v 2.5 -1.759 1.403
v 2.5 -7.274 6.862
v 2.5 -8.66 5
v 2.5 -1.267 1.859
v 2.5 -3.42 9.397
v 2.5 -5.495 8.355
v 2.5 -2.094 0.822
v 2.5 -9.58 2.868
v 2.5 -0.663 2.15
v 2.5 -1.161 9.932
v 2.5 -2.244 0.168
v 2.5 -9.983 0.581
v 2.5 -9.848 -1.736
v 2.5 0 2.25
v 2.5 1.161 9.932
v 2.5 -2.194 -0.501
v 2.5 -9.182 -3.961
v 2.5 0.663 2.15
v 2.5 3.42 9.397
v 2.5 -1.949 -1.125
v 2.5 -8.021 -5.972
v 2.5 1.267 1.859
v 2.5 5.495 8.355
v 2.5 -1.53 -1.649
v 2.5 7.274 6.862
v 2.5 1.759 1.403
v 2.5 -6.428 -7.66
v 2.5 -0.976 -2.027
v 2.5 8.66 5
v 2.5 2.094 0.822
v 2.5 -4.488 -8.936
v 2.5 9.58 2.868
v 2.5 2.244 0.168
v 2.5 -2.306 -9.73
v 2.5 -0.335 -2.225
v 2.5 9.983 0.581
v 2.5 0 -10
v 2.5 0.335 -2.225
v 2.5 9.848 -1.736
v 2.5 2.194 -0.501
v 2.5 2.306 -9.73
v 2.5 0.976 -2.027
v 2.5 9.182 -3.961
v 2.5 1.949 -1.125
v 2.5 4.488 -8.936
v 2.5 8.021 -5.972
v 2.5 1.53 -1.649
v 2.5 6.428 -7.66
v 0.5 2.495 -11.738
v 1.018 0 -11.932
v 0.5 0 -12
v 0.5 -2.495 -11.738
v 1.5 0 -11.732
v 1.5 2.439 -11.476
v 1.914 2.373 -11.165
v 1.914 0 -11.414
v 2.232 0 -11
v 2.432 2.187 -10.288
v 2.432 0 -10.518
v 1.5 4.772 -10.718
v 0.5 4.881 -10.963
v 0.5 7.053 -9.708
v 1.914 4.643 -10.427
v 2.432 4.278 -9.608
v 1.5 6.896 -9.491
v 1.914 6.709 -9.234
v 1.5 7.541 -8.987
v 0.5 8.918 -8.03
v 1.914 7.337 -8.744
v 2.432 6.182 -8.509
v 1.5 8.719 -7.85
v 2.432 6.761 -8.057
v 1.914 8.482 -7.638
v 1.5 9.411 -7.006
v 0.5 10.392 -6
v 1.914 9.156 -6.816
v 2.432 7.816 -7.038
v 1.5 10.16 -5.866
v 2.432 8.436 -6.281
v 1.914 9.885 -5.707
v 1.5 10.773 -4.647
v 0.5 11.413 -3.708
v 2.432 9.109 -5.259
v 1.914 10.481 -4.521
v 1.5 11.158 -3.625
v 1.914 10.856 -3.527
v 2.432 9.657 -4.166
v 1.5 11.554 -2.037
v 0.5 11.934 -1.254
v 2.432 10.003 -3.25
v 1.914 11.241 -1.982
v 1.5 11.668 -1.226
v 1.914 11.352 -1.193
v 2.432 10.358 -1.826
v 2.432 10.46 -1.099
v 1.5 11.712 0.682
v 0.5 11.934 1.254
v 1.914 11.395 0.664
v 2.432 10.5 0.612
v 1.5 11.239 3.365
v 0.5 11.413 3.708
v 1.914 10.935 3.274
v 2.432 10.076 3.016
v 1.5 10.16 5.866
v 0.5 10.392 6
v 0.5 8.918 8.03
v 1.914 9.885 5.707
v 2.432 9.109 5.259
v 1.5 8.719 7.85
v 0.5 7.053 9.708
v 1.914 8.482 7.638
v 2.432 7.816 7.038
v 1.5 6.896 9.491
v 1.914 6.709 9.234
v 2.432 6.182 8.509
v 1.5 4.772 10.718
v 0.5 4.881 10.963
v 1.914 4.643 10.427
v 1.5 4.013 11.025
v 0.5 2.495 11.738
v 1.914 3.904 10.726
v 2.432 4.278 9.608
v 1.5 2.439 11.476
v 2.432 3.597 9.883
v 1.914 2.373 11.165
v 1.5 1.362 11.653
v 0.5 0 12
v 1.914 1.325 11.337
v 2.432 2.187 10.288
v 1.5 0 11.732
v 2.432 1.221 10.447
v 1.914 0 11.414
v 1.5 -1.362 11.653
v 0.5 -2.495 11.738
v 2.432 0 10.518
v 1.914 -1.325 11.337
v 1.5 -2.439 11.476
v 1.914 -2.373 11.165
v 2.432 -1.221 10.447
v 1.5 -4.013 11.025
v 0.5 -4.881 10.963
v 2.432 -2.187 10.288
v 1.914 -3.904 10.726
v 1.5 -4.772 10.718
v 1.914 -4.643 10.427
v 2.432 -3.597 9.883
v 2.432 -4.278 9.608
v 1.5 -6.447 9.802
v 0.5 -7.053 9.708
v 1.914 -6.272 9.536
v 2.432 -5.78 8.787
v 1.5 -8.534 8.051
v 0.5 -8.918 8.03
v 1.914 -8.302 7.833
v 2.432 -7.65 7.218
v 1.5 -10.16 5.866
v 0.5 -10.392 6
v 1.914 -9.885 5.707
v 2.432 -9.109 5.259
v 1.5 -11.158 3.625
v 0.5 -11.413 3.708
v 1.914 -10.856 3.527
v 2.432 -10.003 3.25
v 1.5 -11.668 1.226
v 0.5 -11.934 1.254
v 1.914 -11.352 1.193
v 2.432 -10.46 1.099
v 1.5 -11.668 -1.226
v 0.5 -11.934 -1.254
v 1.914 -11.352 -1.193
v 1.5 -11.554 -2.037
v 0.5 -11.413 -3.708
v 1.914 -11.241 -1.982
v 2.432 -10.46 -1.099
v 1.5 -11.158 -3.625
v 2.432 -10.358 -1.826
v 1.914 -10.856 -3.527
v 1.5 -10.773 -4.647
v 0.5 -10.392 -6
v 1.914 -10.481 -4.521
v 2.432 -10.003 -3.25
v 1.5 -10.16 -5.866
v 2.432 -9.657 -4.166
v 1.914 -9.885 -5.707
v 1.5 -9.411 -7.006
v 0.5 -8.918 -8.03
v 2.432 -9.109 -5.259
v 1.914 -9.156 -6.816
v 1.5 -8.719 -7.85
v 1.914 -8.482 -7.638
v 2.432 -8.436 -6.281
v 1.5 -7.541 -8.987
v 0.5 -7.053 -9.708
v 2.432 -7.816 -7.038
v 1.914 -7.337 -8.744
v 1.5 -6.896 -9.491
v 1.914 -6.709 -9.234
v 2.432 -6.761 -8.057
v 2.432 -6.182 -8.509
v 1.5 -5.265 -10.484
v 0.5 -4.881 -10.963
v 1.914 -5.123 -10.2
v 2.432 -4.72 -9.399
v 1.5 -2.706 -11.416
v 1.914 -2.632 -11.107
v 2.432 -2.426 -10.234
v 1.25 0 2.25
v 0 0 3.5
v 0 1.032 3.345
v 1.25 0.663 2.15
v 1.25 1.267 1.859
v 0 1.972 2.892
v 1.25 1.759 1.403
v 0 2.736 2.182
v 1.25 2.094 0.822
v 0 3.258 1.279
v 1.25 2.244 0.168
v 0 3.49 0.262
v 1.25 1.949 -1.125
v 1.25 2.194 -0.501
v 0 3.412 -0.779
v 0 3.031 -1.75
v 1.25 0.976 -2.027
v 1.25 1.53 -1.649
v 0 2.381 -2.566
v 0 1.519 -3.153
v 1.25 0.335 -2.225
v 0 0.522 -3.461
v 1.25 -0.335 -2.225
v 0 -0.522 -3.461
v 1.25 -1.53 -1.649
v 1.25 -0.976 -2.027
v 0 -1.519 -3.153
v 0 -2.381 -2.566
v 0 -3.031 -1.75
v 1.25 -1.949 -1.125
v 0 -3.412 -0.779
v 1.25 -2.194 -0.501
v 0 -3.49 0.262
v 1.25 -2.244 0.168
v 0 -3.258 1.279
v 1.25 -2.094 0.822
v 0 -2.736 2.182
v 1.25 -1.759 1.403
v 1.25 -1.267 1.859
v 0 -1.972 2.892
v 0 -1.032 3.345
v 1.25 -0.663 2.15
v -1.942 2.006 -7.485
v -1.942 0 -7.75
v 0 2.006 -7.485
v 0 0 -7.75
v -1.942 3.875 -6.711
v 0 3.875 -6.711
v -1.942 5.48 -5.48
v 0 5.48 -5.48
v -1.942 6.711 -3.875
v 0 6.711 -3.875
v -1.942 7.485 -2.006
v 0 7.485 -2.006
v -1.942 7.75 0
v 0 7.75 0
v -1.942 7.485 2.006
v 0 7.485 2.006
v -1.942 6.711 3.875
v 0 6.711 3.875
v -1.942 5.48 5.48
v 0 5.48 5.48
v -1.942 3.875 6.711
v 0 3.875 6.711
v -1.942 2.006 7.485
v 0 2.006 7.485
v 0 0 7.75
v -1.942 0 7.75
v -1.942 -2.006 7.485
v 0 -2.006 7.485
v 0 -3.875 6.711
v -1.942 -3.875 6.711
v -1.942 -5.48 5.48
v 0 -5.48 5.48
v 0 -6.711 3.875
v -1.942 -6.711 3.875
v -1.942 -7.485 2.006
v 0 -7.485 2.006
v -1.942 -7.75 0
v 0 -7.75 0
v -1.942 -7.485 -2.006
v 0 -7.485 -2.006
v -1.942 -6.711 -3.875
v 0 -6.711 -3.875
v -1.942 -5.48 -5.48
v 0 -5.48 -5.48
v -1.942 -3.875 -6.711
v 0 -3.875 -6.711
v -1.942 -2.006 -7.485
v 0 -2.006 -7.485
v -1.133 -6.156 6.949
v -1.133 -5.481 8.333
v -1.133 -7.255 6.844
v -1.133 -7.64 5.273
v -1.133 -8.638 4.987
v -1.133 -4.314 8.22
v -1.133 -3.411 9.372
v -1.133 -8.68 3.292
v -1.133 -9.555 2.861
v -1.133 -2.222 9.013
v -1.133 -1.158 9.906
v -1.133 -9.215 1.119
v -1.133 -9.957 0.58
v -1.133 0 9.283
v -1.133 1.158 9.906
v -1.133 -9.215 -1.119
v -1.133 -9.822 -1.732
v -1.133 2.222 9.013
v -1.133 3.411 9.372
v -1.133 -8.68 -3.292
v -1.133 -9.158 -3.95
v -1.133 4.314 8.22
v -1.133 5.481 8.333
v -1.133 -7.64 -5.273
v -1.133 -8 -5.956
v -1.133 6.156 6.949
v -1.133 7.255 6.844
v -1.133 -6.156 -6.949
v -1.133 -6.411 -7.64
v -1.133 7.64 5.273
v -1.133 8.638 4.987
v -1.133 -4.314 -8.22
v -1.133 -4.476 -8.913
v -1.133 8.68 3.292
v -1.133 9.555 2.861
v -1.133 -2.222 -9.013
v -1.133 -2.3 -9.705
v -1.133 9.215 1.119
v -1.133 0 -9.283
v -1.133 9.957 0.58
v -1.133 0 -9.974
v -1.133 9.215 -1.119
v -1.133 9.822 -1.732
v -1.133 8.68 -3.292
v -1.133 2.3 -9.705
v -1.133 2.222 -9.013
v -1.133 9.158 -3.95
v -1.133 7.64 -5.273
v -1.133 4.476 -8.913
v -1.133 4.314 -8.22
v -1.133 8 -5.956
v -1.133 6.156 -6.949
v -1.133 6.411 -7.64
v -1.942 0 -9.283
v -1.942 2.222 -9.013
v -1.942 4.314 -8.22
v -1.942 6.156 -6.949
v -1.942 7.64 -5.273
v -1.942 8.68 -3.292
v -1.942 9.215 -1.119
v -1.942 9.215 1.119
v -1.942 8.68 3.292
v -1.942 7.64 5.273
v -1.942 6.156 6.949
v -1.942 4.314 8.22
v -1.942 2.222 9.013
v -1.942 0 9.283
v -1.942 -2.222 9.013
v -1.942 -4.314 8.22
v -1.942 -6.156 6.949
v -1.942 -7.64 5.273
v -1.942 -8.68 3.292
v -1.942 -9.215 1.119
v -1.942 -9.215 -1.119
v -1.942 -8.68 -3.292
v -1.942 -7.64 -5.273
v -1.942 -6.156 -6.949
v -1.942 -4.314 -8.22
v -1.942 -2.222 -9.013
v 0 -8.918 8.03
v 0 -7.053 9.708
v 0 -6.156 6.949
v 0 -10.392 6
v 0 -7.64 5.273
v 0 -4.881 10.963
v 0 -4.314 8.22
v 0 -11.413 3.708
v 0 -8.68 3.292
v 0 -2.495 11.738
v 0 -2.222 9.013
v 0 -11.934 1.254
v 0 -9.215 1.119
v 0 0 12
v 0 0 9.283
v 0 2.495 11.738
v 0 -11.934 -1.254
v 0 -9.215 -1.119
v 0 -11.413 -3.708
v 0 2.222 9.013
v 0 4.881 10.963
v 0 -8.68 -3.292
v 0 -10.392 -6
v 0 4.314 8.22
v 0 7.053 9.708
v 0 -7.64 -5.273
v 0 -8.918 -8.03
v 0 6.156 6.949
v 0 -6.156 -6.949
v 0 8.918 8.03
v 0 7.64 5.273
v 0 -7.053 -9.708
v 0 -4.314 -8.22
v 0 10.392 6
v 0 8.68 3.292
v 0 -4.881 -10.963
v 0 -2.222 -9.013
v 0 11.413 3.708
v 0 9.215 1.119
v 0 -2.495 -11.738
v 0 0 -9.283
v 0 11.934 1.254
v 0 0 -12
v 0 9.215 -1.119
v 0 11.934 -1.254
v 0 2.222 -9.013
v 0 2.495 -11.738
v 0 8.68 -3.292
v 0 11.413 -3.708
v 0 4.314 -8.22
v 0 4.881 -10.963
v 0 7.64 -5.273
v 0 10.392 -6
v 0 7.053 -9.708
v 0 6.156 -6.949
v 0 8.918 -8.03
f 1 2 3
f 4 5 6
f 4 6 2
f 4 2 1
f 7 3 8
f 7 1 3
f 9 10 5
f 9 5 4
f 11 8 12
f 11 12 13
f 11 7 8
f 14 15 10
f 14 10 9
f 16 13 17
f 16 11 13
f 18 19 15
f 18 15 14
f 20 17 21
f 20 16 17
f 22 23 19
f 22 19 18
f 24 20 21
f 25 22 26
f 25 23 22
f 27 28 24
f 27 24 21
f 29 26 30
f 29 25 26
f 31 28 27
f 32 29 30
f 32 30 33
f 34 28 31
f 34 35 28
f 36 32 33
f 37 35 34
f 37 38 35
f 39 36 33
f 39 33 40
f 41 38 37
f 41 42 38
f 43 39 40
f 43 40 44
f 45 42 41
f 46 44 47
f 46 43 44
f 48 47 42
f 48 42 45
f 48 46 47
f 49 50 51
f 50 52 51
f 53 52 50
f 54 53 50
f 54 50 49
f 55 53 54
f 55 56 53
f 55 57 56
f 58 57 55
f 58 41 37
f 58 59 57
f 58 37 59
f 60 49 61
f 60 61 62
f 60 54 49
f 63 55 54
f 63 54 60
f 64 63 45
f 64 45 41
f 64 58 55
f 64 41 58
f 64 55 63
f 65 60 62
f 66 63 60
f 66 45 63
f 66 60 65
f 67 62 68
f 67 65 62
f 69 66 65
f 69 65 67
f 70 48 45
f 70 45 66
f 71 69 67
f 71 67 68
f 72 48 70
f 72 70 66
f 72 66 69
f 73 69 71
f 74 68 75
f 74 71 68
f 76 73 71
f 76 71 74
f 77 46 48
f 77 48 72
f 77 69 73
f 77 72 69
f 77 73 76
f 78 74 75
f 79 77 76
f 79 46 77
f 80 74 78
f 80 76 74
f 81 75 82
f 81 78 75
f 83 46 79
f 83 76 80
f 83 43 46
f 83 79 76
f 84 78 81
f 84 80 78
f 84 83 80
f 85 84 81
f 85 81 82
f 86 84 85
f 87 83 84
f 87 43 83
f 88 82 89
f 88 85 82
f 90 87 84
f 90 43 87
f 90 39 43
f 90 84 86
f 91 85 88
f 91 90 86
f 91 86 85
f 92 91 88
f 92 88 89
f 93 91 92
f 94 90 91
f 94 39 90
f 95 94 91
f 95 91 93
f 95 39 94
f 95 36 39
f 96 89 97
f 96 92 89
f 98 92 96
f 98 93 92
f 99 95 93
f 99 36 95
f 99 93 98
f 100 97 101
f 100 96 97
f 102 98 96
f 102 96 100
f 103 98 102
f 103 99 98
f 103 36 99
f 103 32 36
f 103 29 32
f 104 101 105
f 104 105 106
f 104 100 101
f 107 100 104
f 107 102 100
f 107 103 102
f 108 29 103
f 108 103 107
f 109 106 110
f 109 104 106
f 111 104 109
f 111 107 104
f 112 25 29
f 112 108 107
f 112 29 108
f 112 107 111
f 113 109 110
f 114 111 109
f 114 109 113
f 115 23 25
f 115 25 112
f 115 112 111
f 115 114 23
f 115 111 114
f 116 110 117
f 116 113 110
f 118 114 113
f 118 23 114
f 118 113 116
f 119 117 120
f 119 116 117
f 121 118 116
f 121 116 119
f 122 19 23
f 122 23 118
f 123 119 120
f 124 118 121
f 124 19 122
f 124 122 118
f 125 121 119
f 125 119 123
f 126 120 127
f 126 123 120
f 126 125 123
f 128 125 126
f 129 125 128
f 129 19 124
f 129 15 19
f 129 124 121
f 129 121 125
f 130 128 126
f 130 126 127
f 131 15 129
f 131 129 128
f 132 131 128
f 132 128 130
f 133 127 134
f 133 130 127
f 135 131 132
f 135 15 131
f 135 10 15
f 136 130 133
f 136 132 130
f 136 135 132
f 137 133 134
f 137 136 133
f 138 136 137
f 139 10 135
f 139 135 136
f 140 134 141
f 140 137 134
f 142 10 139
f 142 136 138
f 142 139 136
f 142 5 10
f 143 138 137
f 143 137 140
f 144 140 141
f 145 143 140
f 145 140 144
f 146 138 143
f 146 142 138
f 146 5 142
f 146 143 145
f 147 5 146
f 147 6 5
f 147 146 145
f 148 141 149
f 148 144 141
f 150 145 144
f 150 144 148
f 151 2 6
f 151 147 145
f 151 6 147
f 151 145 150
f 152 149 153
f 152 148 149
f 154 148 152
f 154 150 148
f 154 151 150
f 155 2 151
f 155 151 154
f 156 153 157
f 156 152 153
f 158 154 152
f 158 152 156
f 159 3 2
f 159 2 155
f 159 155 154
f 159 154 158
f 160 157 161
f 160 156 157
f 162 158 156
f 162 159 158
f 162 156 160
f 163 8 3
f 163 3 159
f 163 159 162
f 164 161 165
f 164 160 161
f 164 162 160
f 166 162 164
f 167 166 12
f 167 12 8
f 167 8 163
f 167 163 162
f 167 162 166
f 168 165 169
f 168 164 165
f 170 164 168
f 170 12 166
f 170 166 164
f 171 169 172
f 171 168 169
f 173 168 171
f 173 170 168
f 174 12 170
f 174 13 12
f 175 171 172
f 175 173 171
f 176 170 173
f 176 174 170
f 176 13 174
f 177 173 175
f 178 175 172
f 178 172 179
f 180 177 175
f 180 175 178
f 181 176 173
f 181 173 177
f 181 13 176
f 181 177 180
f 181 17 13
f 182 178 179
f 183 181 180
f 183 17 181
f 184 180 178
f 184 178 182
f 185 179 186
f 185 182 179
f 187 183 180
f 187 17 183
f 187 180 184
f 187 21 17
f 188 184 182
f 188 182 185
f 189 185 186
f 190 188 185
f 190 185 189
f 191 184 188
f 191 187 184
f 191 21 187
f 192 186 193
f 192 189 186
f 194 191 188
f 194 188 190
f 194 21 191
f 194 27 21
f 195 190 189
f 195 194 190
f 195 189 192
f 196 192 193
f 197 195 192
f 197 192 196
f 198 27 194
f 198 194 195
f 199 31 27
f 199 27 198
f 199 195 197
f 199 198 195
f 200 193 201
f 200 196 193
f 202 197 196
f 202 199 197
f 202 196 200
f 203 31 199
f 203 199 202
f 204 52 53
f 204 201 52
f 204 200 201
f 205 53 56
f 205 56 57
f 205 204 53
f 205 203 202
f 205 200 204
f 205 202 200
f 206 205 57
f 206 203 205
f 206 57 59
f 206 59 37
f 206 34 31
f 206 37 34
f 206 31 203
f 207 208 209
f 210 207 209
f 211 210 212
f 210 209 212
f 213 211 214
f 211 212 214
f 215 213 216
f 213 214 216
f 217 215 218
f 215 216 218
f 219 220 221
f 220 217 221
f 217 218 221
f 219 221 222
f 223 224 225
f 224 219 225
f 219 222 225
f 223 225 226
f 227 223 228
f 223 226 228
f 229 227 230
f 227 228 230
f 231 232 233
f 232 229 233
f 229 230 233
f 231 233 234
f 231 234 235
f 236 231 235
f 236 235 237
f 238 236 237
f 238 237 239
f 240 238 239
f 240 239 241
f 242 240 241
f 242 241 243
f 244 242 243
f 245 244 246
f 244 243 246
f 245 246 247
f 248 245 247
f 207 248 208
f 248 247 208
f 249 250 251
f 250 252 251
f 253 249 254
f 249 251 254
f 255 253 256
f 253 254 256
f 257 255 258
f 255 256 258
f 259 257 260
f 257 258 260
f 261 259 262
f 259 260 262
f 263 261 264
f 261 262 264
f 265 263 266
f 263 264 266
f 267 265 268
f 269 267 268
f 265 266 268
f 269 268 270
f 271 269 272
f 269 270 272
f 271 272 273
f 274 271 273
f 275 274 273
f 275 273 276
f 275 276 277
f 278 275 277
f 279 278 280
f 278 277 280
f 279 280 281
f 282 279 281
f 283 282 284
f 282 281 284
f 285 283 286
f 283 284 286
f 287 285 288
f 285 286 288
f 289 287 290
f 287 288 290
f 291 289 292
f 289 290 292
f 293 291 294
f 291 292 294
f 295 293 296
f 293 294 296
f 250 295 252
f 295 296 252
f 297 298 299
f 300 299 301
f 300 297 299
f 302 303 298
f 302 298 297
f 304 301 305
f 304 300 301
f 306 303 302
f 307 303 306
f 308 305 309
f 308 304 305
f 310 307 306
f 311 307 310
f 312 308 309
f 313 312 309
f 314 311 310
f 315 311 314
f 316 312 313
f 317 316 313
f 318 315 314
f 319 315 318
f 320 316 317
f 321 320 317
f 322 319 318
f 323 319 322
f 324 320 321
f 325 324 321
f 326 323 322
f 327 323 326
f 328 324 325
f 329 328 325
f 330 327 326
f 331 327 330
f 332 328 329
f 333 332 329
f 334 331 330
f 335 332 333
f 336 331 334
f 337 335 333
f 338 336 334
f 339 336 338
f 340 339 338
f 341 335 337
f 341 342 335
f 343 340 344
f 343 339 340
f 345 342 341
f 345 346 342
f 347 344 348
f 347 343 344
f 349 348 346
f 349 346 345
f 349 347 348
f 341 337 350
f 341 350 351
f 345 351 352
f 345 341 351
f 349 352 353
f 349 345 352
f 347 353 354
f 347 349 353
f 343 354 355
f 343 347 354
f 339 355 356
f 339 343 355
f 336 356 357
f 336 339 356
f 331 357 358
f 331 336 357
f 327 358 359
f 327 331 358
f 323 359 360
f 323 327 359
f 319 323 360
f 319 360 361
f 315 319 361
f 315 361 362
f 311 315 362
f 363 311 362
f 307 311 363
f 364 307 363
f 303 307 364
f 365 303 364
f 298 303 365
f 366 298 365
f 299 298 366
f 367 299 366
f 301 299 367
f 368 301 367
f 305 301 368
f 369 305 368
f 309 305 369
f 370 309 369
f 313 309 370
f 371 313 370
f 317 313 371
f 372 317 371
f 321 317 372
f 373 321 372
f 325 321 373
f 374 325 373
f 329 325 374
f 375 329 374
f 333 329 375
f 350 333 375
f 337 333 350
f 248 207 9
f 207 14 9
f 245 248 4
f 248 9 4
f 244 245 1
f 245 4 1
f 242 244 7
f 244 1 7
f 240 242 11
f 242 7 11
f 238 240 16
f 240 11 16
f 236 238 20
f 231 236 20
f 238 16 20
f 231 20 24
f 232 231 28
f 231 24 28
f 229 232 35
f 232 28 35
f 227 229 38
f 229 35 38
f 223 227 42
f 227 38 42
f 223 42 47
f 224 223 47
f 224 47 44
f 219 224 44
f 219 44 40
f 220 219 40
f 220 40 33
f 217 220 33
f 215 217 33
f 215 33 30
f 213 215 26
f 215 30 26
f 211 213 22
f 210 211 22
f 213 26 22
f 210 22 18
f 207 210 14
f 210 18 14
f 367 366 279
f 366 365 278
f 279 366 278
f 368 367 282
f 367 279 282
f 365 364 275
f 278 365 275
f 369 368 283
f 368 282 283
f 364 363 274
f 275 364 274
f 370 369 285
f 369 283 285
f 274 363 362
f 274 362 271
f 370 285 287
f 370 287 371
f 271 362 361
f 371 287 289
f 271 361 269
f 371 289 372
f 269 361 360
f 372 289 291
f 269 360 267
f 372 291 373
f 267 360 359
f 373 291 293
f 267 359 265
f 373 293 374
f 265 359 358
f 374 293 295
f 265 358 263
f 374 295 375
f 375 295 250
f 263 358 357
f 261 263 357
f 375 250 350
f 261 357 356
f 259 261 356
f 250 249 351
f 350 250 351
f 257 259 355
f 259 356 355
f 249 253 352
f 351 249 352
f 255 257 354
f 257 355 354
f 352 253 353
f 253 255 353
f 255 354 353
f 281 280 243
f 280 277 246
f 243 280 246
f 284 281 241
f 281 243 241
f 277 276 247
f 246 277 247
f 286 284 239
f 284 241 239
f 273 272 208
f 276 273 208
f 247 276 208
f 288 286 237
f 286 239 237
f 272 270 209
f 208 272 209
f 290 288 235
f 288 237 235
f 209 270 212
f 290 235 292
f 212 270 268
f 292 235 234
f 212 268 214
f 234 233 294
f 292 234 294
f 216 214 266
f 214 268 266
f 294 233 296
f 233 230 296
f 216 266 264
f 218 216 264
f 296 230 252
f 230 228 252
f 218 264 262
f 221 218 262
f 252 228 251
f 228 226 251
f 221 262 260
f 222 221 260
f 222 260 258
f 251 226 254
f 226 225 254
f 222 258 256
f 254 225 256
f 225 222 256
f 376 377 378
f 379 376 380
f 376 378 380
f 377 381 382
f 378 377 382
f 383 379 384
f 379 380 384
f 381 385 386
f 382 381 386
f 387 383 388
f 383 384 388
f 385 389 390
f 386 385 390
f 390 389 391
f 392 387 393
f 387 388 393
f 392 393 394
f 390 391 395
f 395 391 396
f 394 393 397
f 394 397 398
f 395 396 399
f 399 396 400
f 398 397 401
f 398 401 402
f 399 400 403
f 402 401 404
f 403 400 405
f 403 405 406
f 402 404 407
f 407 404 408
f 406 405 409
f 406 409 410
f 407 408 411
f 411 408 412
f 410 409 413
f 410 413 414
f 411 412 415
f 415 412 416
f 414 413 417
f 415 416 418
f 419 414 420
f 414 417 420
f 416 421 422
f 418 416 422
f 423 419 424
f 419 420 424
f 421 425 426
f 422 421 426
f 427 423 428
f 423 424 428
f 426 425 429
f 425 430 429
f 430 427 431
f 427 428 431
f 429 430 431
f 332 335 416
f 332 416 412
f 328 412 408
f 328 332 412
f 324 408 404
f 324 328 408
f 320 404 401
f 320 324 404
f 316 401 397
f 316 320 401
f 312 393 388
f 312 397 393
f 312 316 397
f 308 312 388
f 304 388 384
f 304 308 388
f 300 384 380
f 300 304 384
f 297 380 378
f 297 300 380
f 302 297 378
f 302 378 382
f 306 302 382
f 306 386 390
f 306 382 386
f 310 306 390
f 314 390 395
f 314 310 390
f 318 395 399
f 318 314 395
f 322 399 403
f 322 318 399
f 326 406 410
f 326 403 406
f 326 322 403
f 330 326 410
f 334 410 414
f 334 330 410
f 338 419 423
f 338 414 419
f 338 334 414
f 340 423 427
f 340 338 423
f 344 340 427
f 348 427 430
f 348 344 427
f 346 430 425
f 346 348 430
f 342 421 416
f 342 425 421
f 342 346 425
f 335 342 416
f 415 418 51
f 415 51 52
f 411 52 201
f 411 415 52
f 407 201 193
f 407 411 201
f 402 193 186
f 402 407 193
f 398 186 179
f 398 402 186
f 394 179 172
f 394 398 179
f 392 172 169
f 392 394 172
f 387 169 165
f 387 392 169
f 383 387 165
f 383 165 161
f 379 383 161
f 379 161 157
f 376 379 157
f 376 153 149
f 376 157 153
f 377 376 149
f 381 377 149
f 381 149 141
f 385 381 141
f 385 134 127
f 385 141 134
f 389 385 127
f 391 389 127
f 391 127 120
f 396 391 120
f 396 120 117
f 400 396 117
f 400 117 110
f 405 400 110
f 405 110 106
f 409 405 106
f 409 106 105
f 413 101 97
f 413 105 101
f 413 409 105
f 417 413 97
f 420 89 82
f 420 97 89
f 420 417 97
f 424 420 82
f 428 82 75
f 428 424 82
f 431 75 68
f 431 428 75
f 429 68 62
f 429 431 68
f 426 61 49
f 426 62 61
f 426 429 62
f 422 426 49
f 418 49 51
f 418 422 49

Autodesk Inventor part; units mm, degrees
ref_plane "YZ Plane" through (0, 0, 0) normal (1, 0, 0) x (0, 1, 0)
ref_plane "XZ Plane" through (0, 0, 0) normal (0, 1, 0) x (-1, 0, 0)
ref_plane "XY Plane" through (0, 0, 0) normal (0, 0, 1) x (1, 0, 0)
sketch "Schizzo3" plane through (0, 0, 0) normal (0, 1, 0) x (-1, 0, 0)
  line L0 (0, 0) -> (-2.5, 0)
  line L1 (-2.5, 0) -> (-2.5, -12)
  line L2 (-2.5, -12) -> (0, -12)
  line L3 (0, -12) -> (0, -9.2831)
  line L4 (0, -9.2831) -> (1.9415, -9.2831)
  line L5 (1.9415, -9.2831) -> (1.9415, -7.7495)
  line L6 (1.9415, -7.7495) -> (0, -7.7495)
  line L7 (0, -7.7495) -> (0, 0)
  line L8 (1.9415, -9.2831) -> (1.133, -9.9738)
  line L9 (1.133, -9.9738) -> (1.133, -9.2831)
  dimension "d5" = 2.5
  dimension "d6" = 12
revolve "Rivoluzione1" add sketch "Schizzo3" angle 360 about axis through (0, 0, 0) along (1, 0, 0)
fillet "Raccordo1" radius 2 1 edges at (2.5, 0, 12)
sketch "Schizzo6" plane through (0, 0, 0) normal (-1, 0, 0) x (0, 0, 1)
  point P0 (0, 0)
  point P1 (0, 0)
hole "Foro1" at (0, 0, 0) direction (1, 0, 0) diameter 4.5 depth 8 countersink diameter 7 countersink angle 90
